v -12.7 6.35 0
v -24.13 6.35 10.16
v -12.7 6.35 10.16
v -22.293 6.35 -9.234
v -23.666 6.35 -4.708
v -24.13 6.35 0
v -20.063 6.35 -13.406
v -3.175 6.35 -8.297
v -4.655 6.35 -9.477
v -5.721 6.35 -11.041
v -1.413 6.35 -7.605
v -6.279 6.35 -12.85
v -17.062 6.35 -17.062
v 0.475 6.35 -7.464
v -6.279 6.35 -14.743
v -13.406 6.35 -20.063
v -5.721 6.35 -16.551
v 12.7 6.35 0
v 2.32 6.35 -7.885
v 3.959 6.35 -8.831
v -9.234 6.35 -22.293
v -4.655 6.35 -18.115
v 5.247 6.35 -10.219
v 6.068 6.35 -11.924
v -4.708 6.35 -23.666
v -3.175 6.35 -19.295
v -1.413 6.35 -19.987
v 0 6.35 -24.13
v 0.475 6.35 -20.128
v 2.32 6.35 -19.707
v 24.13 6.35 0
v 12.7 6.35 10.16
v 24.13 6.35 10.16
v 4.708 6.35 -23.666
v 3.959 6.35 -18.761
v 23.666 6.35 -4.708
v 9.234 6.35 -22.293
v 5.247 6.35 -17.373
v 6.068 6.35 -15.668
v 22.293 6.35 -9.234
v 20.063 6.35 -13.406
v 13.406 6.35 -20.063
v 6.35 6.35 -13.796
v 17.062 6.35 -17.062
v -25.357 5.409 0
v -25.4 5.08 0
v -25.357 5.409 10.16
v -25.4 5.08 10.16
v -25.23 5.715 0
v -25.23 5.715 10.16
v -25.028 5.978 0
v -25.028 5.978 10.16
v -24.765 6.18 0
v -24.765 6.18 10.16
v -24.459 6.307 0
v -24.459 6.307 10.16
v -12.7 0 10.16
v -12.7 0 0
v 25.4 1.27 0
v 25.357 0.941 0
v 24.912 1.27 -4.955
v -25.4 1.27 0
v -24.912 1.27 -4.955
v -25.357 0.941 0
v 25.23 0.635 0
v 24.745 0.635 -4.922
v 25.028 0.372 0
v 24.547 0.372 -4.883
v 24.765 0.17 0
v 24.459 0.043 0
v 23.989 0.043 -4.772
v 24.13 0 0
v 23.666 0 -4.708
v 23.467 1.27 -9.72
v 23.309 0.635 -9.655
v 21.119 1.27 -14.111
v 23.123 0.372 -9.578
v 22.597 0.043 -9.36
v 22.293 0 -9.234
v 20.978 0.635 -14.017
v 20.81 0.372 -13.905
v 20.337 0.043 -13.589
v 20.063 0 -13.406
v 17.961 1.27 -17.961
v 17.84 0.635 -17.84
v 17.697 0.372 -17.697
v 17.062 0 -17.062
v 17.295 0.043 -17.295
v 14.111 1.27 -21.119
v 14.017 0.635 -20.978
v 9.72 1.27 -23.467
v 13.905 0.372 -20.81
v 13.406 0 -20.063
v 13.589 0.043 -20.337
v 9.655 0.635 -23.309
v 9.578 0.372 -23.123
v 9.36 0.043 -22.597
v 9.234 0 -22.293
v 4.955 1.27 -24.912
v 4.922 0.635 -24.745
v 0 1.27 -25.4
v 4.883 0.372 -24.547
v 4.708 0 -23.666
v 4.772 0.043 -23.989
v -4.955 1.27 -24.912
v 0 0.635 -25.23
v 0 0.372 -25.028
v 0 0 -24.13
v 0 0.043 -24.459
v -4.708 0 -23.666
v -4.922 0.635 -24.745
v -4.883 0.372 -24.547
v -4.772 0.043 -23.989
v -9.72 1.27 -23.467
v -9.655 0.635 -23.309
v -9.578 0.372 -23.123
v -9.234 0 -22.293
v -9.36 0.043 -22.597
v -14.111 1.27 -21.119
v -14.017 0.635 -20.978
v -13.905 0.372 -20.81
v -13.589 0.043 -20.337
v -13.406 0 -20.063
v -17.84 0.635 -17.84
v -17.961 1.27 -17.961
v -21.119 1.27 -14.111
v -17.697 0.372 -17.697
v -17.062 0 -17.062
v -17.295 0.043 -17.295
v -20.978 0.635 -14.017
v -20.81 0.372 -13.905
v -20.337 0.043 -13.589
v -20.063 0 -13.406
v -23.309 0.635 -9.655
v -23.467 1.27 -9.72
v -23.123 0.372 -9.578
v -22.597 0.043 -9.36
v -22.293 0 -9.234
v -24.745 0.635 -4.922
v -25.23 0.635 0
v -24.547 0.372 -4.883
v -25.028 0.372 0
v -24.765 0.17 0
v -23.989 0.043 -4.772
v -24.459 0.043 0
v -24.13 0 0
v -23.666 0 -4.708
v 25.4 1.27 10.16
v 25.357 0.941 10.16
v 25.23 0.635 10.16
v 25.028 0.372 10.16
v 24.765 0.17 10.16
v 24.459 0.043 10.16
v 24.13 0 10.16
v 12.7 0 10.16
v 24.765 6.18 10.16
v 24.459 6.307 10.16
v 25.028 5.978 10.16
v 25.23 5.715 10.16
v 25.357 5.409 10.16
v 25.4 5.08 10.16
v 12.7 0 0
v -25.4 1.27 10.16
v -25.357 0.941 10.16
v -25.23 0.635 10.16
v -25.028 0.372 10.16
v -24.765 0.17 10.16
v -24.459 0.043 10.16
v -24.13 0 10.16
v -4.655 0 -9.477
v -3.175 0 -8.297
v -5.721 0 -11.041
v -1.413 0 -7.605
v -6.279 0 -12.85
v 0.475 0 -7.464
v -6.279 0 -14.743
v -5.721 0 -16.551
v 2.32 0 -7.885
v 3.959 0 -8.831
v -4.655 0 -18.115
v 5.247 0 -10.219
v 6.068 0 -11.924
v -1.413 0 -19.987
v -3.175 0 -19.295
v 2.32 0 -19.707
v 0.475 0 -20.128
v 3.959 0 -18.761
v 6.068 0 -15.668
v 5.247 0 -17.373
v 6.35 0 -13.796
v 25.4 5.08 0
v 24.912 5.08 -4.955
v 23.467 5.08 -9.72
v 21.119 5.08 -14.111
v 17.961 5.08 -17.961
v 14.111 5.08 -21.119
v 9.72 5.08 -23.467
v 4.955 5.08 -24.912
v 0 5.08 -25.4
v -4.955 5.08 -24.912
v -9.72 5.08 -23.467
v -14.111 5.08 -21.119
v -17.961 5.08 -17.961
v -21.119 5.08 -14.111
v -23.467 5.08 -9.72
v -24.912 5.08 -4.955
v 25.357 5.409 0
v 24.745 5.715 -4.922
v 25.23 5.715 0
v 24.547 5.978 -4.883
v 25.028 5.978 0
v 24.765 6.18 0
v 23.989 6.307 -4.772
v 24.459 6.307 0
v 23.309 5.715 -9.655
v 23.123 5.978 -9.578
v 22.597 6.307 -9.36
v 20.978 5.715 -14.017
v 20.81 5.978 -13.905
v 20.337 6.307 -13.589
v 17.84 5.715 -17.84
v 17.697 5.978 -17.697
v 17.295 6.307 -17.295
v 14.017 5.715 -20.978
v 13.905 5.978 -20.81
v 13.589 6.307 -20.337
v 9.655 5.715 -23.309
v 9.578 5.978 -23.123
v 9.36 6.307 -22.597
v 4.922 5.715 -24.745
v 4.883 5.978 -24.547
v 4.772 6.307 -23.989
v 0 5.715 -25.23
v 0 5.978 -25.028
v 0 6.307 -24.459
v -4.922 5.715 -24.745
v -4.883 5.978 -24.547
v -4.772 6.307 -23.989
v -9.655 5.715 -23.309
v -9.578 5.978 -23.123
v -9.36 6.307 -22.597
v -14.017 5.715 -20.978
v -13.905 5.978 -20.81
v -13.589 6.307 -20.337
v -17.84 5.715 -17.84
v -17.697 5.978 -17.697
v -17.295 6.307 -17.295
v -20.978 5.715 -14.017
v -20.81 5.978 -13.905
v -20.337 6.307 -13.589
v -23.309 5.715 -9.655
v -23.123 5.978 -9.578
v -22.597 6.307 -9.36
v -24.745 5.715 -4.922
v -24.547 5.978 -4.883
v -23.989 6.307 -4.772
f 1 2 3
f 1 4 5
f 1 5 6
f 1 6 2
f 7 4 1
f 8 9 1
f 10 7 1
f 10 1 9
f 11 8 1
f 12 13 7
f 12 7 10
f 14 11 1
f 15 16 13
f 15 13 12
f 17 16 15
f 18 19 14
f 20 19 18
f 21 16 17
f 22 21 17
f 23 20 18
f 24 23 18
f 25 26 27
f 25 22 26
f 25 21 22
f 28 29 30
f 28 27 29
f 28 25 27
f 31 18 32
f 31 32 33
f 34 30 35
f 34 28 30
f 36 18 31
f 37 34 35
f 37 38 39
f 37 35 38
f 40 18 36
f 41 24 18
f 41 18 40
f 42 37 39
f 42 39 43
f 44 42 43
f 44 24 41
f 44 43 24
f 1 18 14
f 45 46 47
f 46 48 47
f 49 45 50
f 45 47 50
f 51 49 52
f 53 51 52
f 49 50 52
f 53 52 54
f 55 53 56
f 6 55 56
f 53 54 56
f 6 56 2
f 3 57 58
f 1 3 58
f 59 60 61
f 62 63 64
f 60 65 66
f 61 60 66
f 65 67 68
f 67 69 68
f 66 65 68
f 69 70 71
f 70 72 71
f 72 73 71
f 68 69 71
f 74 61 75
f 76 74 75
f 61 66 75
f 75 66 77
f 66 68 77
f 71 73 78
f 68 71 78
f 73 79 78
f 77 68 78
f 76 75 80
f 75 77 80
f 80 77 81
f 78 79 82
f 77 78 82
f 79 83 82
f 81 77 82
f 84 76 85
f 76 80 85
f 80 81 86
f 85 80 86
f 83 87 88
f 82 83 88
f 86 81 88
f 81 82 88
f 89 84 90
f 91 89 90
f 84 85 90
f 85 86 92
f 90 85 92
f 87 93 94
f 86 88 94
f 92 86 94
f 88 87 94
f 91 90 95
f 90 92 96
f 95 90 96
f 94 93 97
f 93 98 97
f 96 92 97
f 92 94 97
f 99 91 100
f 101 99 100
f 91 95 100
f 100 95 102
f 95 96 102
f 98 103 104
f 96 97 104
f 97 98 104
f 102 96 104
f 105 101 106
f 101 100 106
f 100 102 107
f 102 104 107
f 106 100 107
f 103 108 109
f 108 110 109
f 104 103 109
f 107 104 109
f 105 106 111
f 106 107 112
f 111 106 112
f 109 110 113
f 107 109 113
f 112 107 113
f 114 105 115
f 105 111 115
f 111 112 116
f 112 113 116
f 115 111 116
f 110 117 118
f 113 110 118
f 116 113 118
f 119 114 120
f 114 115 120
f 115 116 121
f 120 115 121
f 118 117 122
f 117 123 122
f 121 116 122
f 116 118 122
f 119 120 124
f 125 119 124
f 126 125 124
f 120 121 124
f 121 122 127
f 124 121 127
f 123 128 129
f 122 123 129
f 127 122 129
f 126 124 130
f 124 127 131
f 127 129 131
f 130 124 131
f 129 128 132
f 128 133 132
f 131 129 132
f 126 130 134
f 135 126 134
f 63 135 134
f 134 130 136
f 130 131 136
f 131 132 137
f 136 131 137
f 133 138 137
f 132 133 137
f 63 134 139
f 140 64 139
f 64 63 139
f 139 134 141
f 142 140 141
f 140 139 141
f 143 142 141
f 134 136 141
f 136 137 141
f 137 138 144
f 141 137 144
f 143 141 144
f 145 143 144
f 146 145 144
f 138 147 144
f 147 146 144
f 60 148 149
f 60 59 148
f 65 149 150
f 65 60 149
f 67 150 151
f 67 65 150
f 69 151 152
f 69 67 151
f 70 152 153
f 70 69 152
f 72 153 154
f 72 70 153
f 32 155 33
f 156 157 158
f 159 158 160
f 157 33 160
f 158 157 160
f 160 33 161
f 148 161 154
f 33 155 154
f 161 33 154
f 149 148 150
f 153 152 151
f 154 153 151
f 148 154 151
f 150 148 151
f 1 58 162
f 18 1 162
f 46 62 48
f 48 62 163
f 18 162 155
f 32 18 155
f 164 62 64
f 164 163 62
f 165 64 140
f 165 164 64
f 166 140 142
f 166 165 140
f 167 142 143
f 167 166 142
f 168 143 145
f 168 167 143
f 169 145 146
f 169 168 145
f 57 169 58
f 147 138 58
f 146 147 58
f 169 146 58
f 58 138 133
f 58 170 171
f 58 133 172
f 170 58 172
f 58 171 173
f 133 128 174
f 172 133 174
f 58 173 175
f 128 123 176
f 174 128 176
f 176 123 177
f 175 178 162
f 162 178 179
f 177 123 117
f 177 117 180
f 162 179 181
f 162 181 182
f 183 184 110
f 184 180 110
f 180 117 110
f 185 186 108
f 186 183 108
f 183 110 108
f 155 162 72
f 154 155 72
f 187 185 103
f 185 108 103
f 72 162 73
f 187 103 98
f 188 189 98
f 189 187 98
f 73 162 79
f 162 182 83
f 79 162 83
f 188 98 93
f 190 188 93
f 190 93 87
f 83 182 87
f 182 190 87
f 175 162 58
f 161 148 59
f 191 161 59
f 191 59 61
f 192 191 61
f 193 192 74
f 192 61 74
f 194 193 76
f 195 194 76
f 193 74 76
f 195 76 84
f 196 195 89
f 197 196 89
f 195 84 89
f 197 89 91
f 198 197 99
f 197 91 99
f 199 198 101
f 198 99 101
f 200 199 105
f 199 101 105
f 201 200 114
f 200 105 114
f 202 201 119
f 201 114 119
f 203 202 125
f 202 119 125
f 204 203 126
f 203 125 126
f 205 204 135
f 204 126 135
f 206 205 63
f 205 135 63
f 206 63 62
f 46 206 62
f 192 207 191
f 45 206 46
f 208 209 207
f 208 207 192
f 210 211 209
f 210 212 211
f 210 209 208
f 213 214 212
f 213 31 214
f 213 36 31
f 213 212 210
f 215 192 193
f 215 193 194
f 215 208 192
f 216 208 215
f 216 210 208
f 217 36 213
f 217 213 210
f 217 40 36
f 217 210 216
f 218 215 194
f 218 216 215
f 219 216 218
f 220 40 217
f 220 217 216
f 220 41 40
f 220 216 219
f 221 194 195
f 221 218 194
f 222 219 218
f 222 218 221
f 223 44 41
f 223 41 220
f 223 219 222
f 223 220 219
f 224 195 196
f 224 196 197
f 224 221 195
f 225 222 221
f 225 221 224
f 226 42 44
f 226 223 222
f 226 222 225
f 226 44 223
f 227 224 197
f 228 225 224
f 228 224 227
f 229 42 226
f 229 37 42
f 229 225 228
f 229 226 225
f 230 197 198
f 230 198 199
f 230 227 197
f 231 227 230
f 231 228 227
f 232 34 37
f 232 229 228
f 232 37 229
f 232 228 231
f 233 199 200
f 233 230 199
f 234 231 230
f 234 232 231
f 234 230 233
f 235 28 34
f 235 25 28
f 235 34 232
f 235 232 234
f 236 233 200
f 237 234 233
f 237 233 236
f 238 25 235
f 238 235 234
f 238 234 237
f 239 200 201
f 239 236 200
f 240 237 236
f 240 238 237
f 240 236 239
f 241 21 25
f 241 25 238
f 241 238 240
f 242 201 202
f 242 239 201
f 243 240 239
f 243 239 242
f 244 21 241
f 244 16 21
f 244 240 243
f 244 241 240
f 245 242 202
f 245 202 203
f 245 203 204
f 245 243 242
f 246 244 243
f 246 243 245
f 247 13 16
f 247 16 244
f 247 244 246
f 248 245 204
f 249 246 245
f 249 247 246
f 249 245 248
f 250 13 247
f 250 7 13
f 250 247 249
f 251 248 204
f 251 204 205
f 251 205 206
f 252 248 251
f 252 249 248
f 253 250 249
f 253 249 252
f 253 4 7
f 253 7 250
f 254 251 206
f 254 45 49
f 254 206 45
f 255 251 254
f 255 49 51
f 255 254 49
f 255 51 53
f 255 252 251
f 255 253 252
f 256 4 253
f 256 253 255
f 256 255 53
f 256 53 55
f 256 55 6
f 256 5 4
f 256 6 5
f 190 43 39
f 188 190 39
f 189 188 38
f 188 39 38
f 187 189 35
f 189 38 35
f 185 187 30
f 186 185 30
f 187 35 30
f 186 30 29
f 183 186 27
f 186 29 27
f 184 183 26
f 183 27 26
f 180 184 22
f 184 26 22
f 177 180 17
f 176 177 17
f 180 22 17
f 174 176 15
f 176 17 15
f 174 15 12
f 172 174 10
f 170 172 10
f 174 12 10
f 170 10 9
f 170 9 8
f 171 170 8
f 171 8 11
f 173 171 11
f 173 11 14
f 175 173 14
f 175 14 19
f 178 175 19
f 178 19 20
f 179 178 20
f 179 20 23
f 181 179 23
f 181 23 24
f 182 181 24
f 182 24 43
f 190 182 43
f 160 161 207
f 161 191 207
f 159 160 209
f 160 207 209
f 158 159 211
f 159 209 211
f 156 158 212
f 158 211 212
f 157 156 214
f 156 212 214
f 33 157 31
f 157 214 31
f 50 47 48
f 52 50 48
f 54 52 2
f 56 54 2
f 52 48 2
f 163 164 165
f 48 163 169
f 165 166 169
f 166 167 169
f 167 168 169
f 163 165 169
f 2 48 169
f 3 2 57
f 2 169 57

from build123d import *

# Parameters (mm, degrees)
BOSS_EXTRUDE1_DEPTH = 6.35
FILLET2_R           = 1.27
SKETCH2_R           = 6.35
CUT_EXTRUDE1_DEPTH  = 7.35


with BuildPart() as part:
    # Sketch1 → Boss-Extrude1 (new body)
    with BuildSketch(Plane(origin=(0, 0, 0), x_dir=(1, 0, 0), z_dir=(0, 1, 0))):
        with BuildLine():
            Line((-25.4, -10.16), (-12.7, -10.16))
            Line((-12.7, -10.16), (-12.7, 0))
            Line((-12.7, 0), (12.7, 0))
            Line((12.7, 0), (12.7, -10.16))
            Line((12.7, -10.16), (25.4, -10.16))
            Line((25.4, -10.16), (25.4, 0))
            ThreePointArc((25.4, 0), (0, 25.4), (-25.4, 0))
            Line((-25.4, 0), (-25.4, -10.16))
        make_face()
    extrude(amount=BOSS_EXTRUDE1_DEPTH)

    # Fillet2
    fillet2_edges = [part.edges().sort_by_distance(p)[0] for p in [
        (-25.4, 0, 5.08),
        (0, 0, -25.4),
        (25.4, 6.35, 5.08),
        (0, 6.35, -25.4),
        (-25.4, 6.35, 5.08),
        (25.4, 0, 5.08),
    ]]
    fillet(fillet2_edges, radius=FILLET2_R)

    # Sketch2 → Cut-Extrude1 (cut, through all)
    with BuildSketch(Plane(origin=(0, 6.35, 0), x_dir=(1, 0, 0), z_dir=(0, 1, 0))):
        with Locations((0, 13.796082309)):
            Circle(SKETCH2_R)
    extrude(amount=-CUT_EXTRUDE1_DEPTH, mode=Mode.SUBTRACT)


solid = part.part
